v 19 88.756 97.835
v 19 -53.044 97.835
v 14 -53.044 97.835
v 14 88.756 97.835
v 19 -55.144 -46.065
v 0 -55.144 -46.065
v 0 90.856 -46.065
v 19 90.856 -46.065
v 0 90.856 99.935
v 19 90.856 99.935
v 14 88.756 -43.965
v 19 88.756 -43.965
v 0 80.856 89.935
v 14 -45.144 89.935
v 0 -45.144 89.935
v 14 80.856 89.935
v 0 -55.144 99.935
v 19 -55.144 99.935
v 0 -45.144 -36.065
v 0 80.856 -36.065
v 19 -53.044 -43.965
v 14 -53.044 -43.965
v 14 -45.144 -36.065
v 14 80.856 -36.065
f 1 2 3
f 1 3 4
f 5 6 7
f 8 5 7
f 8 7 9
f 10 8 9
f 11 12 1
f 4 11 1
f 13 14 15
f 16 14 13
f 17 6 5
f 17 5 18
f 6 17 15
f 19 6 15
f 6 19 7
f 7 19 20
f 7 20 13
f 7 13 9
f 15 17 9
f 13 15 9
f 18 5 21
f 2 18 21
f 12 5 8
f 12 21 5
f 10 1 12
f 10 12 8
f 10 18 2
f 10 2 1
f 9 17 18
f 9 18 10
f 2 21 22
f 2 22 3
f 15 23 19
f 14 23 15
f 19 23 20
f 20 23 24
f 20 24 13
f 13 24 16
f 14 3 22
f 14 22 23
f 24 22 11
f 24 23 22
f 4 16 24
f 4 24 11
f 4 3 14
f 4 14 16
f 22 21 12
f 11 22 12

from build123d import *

# Parameters (mm, degrees)
F0_W     = 146
F0_H     = 146
F1_DEPTH = 19
F2_W     = 126
F2_H     = 126
F3_DEPTH = 25
F4_W     = 141.8
F4_H     = 141.8
F5_DEPTH = 5


# Not quite as in the source:
# - a feature names something its author has since deleted; it is built from what else it names


with BuildPart() as f1:
    # F0 (on Right) → F1 (new body)
    with BuildSketch(Plane.YZ):
        with Locations((17.8558837175, 26.935071826)):
            Rectangle(F0_W, F0_H)
    extrude(amount=F1_DEPTH)

    # F2 (on face) → F3 (cut)
    with BuildSketch(Plane.YZ.offset(19)):
        with Locations((17.8558837175, 26.935071826)):
            Rectangle(F2_W, F2_H)
    extrude(amount=-F3_DEPTH, mode=Mode.SUBTRACT)

    # F4 (on face) → F5 (cut)
    with BuildSketch(Plane.YZ.offset(19)):
        with Locations((17.8558837175, 26.935071826)):
            Rectangle(F4_W, F4_H)
    extrude(amount=-F5_DEPTH, mode=Mode.SUBTRACT)


solid = f1.part
